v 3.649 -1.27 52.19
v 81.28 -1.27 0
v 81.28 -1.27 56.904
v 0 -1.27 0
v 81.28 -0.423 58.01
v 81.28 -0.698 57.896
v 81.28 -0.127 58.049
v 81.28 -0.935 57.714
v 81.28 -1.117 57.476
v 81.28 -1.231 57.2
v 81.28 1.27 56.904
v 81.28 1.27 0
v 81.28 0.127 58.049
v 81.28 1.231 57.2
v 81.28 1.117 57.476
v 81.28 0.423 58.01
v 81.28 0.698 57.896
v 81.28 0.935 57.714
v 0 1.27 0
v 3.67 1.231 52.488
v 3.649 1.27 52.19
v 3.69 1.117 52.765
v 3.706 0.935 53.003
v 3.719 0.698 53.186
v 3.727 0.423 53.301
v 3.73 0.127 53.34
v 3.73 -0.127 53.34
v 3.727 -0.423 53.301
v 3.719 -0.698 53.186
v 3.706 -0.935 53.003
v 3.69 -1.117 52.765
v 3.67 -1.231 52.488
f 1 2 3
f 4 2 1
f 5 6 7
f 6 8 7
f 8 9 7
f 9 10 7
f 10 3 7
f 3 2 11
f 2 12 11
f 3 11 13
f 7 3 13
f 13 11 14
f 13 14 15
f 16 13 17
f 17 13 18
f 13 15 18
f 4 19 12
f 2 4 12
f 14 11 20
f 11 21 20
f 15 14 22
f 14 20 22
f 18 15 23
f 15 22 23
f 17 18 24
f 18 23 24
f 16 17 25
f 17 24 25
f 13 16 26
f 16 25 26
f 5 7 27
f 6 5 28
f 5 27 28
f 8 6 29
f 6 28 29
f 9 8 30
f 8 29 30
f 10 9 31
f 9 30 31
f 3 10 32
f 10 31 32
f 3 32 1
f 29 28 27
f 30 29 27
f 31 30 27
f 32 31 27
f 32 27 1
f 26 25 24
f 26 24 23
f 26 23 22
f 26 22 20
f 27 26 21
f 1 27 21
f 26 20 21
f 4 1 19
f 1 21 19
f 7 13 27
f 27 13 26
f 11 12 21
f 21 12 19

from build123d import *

# Parameters (mm, degrees)
BOSS_EXTRUDE1_DEPTH = 1.27
FILLET1_R           = 1.143


with BuildPart() as part:
    # Sketch1 → Boss-Extrude1 (new body, symmetric)
    with BuildSketch(Plane(origin=(0, 0, 0), x_dir=(1, 0, 0), z_dir=(0, 1, 0))):
        Polygon((0, 0), (81.28, 0), (81.28, -58.049008178), (3.729896149, -53.34), align=None)
    extrude(amount=BOSS_EXTRUDE1_DEPTH, both=True)

    # Fillet1
    fillet1_edges = [part.edges().sort_by_distance(p)[0] for p in [
        (42.504948075, -1.27, 55.694504089),
        (42.504948075, 1.27, 55.694504089),
    ]]
    fillet(fillet1_edges, radius=FILLET1_R)


solid = part.part
